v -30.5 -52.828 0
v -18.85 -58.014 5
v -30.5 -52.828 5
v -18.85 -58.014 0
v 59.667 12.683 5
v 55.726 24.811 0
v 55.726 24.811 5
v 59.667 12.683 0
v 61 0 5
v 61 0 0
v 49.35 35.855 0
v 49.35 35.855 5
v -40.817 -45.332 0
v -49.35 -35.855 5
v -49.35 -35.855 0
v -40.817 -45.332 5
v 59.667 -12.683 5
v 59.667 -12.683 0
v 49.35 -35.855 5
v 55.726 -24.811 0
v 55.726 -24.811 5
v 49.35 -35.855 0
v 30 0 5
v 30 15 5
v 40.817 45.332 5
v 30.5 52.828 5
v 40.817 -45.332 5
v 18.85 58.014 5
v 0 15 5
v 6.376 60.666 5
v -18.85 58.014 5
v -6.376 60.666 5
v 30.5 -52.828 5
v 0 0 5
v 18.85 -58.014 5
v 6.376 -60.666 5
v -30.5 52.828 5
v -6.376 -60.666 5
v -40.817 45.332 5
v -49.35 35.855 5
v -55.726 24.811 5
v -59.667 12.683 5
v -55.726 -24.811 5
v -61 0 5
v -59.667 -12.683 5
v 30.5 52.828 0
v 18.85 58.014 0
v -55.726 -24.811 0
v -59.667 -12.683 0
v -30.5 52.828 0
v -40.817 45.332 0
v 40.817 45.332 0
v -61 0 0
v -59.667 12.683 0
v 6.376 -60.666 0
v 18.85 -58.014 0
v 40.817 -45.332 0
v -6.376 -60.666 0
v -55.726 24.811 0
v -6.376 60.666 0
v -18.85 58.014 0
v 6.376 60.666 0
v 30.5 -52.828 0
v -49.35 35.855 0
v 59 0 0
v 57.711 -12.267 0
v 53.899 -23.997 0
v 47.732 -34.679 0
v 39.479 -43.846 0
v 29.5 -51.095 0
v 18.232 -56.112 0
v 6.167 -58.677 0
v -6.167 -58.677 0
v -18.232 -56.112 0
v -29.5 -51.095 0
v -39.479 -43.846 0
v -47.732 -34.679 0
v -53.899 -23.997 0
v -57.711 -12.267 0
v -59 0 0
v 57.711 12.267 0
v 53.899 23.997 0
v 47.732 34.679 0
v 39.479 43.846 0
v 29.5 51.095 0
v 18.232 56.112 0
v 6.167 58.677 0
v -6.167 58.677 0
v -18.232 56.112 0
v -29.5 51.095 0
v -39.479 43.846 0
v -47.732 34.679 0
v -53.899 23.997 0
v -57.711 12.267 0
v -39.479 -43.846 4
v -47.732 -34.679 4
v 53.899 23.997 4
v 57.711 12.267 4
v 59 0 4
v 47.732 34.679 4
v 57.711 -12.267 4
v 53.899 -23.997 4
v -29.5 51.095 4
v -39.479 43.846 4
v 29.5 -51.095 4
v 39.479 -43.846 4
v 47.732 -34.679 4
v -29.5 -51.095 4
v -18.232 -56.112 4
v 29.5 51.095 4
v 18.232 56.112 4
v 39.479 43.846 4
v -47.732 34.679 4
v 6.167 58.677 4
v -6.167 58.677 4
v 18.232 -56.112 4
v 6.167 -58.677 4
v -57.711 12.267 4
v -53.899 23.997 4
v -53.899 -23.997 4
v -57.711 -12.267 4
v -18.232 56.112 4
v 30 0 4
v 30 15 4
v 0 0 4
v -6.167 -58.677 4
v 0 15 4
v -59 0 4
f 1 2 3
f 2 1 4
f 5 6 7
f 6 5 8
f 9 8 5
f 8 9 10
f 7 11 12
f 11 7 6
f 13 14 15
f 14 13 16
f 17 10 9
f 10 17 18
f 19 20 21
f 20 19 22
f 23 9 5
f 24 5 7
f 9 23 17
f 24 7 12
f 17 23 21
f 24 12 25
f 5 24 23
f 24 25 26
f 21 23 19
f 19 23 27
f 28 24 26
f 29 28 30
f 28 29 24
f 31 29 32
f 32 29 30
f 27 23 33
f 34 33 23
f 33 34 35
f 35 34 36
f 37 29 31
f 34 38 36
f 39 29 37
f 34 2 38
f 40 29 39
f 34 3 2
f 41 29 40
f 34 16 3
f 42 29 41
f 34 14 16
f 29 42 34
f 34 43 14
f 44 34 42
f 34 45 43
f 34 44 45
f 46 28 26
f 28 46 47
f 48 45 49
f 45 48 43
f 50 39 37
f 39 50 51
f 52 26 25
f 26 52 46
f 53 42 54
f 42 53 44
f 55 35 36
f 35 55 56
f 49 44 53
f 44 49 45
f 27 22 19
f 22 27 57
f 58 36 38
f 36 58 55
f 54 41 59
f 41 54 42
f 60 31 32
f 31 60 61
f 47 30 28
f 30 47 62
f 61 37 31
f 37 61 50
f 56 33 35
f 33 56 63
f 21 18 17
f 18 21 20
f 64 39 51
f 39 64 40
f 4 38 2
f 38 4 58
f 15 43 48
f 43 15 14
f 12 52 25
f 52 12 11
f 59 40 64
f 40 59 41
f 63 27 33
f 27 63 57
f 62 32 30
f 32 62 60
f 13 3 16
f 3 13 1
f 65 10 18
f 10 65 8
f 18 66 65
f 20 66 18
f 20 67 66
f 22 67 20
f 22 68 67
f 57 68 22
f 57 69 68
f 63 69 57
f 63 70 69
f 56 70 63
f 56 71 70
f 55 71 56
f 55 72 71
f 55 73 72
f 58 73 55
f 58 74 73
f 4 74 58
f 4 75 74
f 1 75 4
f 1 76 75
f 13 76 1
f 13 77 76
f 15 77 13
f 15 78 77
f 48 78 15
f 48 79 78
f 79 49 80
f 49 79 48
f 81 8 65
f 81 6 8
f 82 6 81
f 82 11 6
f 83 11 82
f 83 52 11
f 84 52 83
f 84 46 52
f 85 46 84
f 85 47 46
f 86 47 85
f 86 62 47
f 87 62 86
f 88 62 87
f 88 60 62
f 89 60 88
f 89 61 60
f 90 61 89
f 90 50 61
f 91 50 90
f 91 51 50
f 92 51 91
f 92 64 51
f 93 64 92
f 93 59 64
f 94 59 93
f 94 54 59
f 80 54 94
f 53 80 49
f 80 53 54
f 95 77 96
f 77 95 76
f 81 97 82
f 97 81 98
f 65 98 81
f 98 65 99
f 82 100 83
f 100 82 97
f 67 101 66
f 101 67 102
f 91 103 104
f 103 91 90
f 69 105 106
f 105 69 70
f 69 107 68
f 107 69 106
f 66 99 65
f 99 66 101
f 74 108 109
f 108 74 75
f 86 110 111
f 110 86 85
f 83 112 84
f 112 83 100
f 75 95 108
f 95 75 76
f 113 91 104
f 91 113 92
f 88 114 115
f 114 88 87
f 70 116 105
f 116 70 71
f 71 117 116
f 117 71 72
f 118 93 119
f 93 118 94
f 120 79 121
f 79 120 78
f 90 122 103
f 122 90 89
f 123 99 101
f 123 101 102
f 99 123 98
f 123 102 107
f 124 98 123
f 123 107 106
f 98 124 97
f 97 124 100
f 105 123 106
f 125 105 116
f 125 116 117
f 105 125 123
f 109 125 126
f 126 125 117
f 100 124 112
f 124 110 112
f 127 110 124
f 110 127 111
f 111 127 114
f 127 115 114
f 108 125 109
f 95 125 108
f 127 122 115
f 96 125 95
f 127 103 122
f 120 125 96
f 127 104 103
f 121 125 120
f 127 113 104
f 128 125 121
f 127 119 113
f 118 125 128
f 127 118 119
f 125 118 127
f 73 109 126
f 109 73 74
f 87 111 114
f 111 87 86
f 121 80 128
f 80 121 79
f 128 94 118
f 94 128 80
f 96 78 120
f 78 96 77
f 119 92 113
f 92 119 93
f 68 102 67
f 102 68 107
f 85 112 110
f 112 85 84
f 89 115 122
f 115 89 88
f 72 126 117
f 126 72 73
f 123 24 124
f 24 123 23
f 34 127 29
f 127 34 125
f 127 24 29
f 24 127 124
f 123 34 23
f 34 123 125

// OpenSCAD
difference() {
    fullHeight = 5;
    outerRadius = 61;
    innerRadius = outerRadius - 2;
    slitLength = 30;
    slitWidth = 15;
    spacing = 5;
    
    // full cylinder
    cylinder(fullHeight, outerRadius, outerRadius);
    
    // cut-out to make lid-shaped
    cylinder(fullHeight - 1, innerRadius, innerRadius);
    
    addSlits(outerRadius, slitLength, slitWidth, fullHeight, spacing);
}

module addSlits (outerRadius, slitLength, slitWidth, fullHeight, spacing) {
    cube([slitLength, slitWidth, fullHeight + .001]);
}


module addHoles (outerRadius, holeRadius, fullHeight, gapBetweenHoles) {
    r = outerRadius - holeRadius - gapBetweenHoles;
    echo(r=r);
    
    if (r > holeRadius) {
        n = floor((2*PI*r)/(2*holeRadius + gapBetweenHoles));
        step = 360/n;
    
        for (i=[0:step:359]) {
                angle = i;
                dx = r*cos(angle);
                dy = r*sin(angle);
                translate([dx,dy,0])
                    cylinder(fullHeight + .001, holeRadius, holeRadius);
            }
            
        addHoles(r - holeRadius, holeRadius, fullHeight, gapBetweenHoles);
        }
    }
